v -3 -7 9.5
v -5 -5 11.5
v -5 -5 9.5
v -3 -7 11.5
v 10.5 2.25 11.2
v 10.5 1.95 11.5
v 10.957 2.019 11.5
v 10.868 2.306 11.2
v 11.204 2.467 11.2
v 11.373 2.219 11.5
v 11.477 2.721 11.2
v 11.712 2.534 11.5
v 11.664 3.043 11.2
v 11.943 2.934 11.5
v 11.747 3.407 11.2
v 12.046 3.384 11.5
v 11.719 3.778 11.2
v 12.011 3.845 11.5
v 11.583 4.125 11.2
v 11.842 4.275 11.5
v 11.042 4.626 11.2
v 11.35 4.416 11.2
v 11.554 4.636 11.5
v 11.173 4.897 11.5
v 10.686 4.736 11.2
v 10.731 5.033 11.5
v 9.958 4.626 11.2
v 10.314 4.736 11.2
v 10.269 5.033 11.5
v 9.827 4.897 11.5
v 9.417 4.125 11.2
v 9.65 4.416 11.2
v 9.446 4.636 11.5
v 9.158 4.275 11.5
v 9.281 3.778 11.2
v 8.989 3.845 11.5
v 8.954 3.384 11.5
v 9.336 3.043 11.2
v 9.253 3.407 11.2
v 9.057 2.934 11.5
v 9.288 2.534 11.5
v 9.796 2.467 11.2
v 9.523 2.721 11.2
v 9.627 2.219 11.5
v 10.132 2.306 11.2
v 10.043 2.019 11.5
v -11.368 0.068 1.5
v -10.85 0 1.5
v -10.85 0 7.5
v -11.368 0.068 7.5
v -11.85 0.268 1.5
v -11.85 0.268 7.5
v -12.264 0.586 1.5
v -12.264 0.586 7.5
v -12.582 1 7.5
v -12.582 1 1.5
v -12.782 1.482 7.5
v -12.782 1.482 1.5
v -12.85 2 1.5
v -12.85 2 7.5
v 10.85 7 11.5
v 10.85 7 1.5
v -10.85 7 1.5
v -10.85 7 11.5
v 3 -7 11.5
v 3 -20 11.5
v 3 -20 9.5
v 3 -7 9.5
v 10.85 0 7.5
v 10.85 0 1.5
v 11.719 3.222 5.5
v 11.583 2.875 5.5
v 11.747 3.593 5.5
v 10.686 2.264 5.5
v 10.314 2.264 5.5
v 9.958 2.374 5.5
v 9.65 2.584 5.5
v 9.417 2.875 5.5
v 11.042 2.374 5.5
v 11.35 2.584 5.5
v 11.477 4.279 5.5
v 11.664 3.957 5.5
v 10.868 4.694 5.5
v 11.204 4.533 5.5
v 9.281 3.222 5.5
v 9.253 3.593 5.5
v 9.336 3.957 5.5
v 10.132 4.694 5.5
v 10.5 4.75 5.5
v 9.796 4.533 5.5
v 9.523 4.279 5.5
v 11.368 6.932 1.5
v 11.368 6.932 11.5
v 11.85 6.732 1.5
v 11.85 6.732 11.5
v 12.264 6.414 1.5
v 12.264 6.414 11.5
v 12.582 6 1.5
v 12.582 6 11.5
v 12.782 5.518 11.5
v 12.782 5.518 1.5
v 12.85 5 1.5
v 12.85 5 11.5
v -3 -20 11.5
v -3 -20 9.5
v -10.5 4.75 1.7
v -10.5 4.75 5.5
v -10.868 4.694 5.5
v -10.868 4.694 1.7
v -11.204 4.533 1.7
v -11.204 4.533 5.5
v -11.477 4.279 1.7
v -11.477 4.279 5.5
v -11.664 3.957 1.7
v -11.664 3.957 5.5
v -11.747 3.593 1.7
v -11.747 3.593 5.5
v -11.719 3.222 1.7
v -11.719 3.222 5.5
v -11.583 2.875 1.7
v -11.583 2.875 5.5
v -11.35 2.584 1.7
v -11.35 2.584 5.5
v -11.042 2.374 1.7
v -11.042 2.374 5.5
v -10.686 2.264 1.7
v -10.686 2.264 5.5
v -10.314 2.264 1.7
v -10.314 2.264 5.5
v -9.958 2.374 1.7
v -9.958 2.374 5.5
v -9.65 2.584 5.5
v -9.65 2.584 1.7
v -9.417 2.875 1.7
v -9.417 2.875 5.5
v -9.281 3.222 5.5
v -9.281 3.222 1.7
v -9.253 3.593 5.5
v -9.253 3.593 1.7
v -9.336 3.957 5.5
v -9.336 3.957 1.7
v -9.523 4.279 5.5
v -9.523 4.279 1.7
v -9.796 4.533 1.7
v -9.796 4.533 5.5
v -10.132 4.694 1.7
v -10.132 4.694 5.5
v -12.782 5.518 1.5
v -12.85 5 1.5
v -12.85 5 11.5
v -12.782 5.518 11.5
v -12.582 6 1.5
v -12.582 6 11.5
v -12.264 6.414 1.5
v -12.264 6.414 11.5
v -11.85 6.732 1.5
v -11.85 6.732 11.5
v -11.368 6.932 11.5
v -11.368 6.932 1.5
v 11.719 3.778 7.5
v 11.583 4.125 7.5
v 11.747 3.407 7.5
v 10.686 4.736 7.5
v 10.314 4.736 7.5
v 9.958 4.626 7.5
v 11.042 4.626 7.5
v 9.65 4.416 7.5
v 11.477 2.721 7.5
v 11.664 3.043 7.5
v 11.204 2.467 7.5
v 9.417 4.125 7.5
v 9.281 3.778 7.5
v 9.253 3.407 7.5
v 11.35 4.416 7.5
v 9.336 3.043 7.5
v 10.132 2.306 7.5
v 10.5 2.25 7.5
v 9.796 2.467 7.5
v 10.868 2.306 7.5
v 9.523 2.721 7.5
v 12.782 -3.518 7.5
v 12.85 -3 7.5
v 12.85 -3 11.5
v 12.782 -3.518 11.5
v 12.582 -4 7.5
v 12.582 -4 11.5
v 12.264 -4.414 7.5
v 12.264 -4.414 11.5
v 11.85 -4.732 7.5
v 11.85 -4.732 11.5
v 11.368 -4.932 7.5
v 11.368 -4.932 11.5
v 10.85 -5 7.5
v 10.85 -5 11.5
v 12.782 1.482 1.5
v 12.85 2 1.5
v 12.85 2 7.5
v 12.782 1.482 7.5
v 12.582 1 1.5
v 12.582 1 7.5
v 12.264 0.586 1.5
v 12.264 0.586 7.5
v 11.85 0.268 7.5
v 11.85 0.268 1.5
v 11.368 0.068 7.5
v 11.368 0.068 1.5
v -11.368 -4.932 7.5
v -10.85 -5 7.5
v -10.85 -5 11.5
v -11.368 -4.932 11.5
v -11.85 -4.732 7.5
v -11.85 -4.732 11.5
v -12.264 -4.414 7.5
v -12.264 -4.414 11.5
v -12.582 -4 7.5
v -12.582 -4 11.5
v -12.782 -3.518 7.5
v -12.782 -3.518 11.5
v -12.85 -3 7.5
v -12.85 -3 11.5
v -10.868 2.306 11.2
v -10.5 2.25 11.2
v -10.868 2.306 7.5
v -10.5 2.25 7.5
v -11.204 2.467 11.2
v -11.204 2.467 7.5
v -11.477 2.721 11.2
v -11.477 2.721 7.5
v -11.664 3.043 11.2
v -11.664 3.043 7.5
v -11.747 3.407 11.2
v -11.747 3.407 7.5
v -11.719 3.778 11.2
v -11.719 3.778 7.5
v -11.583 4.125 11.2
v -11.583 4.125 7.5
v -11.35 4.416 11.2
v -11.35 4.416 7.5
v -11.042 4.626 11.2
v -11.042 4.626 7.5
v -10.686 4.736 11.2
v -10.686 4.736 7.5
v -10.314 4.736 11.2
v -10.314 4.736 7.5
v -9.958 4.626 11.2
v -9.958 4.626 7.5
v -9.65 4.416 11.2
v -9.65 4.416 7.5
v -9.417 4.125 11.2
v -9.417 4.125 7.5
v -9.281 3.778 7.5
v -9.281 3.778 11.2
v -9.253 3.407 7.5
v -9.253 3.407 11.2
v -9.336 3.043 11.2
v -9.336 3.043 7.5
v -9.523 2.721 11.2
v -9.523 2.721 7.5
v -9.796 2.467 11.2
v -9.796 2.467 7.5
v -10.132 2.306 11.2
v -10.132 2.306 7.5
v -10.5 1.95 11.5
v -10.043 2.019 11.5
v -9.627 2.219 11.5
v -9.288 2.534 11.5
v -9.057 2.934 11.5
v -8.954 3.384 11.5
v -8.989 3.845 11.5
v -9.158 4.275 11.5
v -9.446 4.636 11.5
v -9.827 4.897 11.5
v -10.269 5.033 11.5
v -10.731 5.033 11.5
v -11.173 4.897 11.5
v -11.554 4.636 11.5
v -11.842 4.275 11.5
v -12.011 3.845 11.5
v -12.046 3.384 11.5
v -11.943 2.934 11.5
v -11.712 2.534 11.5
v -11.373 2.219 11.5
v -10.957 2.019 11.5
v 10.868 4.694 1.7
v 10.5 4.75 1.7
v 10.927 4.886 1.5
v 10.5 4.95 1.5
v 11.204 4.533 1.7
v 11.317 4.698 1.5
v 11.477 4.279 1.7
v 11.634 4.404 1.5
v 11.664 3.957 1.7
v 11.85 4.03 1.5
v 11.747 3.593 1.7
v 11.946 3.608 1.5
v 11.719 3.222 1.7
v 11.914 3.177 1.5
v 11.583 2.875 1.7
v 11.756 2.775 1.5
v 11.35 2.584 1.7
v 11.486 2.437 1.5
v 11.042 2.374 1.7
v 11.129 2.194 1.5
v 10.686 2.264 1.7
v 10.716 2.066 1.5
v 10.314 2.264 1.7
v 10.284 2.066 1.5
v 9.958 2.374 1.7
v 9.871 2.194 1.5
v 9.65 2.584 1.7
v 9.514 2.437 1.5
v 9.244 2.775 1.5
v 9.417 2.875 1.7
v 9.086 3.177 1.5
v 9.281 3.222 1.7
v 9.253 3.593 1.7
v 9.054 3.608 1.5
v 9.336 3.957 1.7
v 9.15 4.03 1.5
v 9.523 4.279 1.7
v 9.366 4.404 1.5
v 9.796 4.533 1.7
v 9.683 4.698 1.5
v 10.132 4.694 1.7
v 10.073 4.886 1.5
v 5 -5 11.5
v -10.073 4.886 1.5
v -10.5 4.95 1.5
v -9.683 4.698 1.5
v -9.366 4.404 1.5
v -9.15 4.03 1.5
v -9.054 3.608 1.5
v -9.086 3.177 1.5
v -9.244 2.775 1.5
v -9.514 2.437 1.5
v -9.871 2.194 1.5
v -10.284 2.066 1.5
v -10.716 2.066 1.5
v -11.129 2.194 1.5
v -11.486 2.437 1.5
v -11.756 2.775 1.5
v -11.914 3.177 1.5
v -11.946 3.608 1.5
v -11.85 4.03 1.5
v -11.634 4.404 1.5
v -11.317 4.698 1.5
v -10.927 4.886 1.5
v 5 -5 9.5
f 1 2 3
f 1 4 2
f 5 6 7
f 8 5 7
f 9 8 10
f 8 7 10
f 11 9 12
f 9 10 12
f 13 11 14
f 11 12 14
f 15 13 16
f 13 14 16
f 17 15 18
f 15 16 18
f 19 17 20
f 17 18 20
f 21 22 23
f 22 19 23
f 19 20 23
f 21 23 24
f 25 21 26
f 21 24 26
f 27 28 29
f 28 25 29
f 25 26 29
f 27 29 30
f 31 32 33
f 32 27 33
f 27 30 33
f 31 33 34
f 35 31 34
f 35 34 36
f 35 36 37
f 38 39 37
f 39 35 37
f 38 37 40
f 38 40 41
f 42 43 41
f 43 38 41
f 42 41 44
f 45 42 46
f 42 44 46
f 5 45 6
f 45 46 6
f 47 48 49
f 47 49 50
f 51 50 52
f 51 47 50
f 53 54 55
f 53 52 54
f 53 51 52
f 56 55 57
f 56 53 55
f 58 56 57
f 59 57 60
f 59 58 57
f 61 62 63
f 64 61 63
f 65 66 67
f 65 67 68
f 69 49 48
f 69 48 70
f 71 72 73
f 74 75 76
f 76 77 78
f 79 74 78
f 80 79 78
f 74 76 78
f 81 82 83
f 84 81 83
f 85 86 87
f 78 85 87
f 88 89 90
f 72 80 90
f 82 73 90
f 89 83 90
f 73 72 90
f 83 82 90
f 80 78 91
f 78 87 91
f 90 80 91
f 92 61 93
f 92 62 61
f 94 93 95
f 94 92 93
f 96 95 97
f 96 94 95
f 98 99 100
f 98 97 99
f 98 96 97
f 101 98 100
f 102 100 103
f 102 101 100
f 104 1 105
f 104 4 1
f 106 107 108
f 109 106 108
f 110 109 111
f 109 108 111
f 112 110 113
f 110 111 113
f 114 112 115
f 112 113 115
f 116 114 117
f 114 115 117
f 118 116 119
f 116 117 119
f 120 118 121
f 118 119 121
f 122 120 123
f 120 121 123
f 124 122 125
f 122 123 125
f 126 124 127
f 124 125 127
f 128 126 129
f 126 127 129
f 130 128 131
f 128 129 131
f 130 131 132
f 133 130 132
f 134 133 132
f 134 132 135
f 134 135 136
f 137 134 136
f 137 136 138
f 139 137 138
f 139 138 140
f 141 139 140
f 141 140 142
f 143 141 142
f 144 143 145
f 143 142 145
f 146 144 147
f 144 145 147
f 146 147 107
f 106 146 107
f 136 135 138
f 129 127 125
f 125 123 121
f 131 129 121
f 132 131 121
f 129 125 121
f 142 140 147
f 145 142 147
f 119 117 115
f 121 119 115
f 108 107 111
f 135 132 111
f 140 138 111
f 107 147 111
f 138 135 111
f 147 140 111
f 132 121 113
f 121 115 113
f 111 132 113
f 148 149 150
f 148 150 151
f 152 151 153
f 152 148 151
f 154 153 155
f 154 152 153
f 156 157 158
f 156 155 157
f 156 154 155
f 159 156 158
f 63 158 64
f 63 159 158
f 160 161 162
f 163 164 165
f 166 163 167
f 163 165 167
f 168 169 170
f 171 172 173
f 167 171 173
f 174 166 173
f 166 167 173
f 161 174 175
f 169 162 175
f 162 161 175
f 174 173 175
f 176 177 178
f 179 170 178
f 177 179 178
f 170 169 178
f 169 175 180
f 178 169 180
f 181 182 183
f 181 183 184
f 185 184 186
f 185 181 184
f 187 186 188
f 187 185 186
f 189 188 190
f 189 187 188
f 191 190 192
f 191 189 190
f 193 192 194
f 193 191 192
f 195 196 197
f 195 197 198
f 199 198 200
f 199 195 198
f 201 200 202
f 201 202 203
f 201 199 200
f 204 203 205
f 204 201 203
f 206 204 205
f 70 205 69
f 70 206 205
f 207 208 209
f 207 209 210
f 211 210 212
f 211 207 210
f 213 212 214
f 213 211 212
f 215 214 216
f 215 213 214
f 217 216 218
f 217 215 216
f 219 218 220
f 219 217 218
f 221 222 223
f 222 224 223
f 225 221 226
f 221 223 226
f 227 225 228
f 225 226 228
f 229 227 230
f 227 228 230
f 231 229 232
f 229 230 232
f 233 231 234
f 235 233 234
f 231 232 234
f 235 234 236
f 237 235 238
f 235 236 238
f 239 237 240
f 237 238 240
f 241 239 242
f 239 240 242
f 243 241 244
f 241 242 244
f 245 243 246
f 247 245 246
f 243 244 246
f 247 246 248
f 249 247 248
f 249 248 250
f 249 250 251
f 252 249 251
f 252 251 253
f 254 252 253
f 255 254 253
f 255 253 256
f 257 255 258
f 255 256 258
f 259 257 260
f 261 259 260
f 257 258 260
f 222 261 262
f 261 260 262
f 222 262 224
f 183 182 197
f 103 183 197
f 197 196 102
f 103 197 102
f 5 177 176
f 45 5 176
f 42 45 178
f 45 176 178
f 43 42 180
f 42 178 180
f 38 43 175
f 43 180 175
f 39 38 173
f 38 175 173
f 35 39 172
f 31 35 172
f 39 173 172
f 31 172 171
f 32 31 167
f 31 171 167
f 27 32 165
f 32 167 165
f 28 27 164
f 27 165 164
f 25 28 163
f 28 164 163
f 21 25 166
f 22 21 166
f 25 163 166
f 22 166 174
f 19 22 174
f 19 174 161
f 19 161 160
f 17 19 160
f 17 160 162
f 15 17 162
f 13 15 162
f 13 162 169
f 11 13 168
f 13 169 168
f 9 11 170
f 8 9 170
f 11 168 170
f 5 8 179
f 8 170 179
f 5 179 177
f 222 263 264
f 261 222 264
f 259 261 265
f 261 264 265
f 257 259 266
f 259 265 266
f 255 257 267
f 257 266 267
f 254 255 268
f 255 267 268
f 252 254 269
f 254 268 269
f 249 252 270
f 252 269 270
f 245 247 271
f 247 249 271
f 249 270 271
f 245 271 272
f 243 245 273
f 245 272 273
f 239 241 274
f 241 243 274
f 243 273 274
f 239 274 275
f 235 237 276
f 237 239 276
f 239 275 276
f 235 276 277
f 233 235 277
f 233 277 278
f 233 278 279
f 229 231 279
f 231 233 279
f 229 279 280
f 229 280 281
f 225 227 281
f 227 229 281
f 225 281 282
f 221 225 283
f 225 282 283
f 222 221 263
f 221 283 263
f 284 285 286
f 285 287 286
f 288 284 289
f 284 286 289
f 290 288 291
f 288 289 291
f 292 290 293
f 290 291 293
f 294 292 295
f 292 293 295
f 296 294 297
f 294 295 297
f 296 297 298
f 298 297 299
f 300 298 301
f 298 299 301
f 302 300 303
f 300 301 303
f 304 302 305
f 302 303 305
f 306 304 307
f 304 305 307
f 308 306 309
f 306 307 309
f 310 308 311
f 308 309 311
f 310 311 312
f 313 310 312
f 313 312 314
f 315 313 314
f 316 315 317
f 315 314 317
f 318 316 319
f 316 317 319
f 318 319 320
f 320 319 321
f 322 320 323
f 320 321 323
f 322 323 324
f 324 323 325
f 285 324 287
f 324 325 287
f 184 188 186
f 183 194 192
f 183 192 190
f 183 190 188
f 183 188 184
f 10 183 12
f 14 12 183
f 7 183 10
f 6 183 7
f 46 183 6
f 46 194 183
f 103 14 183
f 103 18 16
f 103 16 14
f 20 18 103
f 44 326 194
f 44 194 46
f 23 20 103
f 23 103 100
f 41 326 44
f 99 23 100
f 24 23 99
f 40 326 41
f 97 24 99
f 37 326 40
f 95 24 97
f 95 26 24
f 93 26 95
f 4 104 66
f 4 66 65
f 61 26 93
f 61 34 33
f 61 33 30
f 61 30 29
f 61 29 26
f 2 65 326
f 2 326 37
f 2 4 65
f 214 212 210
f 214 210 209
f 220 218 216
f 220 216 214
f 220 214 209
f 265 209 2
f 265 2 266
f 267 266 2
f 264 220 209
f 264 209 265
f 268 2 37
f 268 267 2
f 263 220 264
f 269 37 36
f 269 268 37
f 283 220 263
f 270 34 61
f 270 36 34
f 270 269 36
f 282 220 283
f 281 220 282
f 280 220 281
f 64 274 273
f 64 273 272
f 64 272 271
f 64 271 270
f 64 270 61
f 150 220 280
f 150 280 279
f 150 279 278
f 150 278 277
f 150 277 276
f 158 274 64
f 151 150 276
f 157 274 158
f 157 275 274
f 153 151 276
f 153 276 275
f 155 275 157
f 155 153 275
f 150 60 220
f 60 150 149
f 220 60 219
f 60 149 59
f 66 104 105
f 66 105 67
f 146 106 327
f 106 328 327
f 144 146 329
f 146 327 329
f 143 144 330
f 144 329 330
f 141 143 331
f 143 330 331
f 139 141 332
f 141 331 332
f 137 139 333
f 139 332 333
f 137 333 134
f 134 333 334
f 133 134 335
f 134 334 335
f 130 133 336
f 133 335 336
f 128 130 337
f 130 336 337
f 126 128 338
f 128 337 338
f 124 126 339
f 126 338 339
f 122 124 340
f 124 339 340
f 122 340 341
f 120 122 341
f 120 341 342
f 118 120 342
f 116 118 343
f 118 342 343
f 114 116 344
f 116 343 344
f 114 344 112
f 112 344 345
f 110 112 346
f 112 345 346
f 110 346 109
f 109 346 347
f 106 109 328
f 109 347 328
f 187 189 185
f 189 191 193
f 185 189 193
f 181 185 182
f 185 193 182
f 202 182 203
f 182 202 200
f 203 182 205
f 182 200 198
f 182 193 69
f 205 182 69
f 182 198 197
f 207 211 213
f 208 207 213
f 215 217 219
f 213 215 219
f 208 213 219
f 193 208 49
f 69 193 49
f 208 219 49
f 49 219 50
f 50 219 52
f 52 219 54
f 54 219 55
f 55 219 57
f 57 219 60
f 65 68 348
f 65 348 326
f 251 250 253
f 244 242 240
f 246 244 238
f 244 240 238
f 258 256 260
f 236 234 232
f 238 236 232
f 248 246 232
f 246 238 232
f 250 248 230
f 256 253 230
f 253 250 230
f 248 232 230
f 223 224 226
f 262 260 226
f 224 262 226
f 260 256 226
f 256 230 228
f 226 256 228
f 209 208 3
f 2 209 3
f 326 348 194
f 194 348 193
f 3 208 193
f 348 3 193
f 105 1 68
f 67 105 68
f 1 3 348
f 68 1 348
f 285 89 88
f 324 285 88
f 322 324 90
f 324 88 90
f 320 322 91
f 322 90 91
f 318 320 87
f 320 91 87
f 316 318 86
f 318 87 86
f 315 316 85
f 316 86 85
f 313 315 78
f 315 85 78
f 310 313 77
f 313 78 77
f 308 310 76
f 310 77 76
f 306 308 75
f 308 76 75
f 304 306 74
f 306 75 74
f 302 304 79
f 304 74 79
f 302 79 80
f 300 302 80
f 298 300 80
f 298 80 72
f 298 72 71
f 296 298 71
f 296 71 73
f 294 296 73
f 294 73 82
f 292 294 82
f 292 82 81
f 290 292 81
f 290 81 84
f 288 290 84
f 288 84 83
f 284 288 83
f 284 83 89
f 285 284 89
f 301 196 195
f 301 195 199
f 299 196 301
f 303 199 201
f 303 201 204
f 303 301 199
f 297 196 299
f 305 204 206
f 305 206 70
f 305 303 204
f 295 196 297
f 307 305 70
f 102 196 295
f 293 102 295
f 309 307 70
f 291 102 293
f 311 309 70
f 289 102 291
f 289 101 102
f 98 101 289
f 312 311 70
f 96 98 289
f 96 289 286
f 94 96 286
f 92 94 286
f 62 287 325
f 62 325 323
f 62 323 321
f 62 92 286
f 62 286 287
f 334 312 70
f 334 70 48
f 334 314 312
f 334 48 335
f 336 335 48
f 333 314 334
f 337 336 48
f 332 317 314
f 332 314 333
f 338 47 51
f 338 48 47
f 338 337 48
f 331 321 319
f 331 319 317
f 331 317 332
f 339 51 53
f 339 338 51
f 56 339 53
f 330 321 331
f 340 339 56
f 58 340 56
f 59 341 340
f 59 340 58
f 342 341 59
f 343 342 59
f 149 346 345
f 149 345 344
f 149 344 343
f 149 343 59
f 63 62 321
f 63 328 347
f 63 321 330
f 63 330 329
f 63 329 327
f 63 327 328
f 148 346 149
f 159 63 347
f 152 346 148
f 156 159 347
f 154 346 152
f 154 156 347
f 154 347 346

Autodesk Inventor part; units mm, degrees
ref_plane "YZ Plane" through (0, 0, 0) normal (1, 0, 0) x (0, 1, 0)
ref_plane "XZ Plane" through (0, 0, 0) normal (0, 1, 0) x (-1, 0, 0)
ref_plane "РабПлоскость1" through (0, -17.25, 7.5) normal (0, 0, 1) x (0, 1, 0)
sketch "Эскиз1" plane through (0, -17.25, 7.5) normal (0, 0, 1) x (0, 1, 0)
  line L0 (17.25, 0) -> (-17.1875, 0) construction
  line L1 (17.25, 10.35) -> (17.25, -10.35) construction
  line L2 (22.25, 12.85) -> (14.25, 12.85)
  line L3 (12.25, 10.85) -> (12.25, -10.85)
  line L4 (14.25, -12.85) -> (22.25, -12.85)
  line L5 (24.25, -10.85) -> (24.25, 10.85)
  line L6 (14.75, -12.85) -> (-9.95, -12.85) construction
  arc A0 (24.25, 10.85) -> (22.25, 12.85) centre (22.25, 10.85) ccw
  arc A1 (22.25, -12.85) -> (24.25, -10.85) centre (22.25, -10.85) ccw
  arc A2 (12.25, -10.85) -> (14.25, -12.85) centre (14.25, -10.85) ccw
  arc A3 (14.25, 12.85) -> (12.25, 10.85) centre (14.25, 10.85) ccw
  point P0 (12.25, -12.85)
  point P1 (12.25, 12.85)
  point P2 (24.25, -12.85)
  dimension "d1" = 5
  dimension "d2" = 12
  dimension "d3" = 2
  dimension "d6" = 2
extrude "Выдавливание1" add sketch "Эскиз1" along normal blind 4
sketch "Эскиз2" plane through (0, -17.25, 7.5) normal (0, 0, -1) x (-1, 0, 0)
  line L0 (10.35, 17.25) -> (-10.35, 17.25) construction
  line L1 (-10.85, 24.25) -> (10.85, 24.25) construction
  line L2 (-12.85, 14.25) -> (-12.85, 22.25) projected
  arc A0 (-12.85, 14.25) -> (-10.85, 12.25) centre (-10.85, 14.25) ccw projected
  line L3 (10.85, 12.25) -> (-10.85, 12.25) construction
  arc A1 (10.85, 12.25) -> (12.85, 14.25) centre (10.85, 14.25) ccw projected
  line L4 (12.85, 22.25) -> (12.85, 14.25) projected
  arc A2 (12.85, 22.25) -> (10.85, 24.25) centre (10.85, 22.25) ccw projected
  line L5 (-10.85, 24.25) -> (10.85, 24.25) projected
  arc A3 (-10.85, 24.25) -> (-12.85, 22.25) centre (-10.85, 22.25) ccw projected
  line L6 (12.85, 17.25) -> (-12.85, 17.25)
  point P0 (0, 17.25)
  point P1 (0, 17.25)
extrude "Выдавливание2" add sketch "Эскиз2" along normal blind 6
fillet "Сопряжение1" radius 2 2 edges at (-12.85, 0, 4.5) (12.85, 0, 4.5)
sketch "Эскиз3" plane through (0, -17.25, 1.5) normal (0, 0, -1) x (-1, 0, 0)
  arc A0 (-12.85, 19.25) -> (-10.85, 17.25) centre (-10.85, 19.25) ccw construction
  line L0 (-10.85, 17.25) -> (10.85, 17.25) construction
  arc A1 (10.85, 17.25) -> (12.85, 19.25) centre (10.85, 19.25) ccw construction
  line L1 (12.85, 19.25) -> (12.85, 22.25) construction
  arc A2 (12.85, 22.25) -> (10.85, 24.25) centre (10.85, 22.25) ccw construction
  line L2 (10.85, 24.25) -> (-10.85, 24.25) construction
  arc A3 (-10.85, 24.25) -> (-12.85, 22.25) centre (-10.85, 22.25) ccw construction
  line L3 (-12.85, 22.25) -> (-12.85, 19.25) construction
  line L4 (12.85, 20.75) -> (-12.85, 20.75) construction
  line L5 (0, 17.25) -> (0, 28) construction
  point P0 (10.5, 20.75)
  point P1 (-10.5, 20.75)
  dimension "d10" = 21
hole "Отверстие1" at (-10.5, 3.5, 1.5) at (10.5, 3.5, 1.5) direction (0, 0, 1) diameter 2.5 depth 4
chamfer "Фаска1" distance 0.2 angle 45 2 edges at (10.5, 2.25, 1.5) (-10.5, 2.25, 1.5)
sketch "Эскиз4" plane through (0, -17.25, 11.5) normal (0, 0, 1) x (1, 0, 0)
  line L0 (0, 17.25) -> (0, -22) construction
  line L1 (-10.85, 12.25) -> (10.85, 12.25) construction
  line L2 (-10.85, 12.25) -> (10.85, 12.25) projected
  line L3 (3, 12.25) -> (-3, 12.25)
  line L4 (-3, 12.25) -> (-3, -2.75)
  line L5 (-3, -2.75) -> (3, -2.75)
  line L6 (3, -2.75) -> (3, 12.25)
  dimension "d21" = 15
  dimension "d22" = 6
extrude "Выдавливание3" add sketch "Эскиз4" against normal blind 2
chamfer "Фаска2" distance 2 angle 45 2 edges at (-3, -5, 10.5) (3, -5, 10.5)
sketch "Эскиз5" plane through (0, -17.25, 11.5) normal (0, 0, 1) x (1, 0, 0)
  circle A0 centre (-10.5, 20.75) radius 1.45 projected
  circle A1 centre (10.5, 20.75) radius 1.45 projected
  circle A2 centre (-10.5, 20.75) radius 1.25 projected
  point P0 (0, 17.25)
hole "Отверстие2" at (10.5, 3.5, 11.5) at (-10.5, 3.5, 11.5) direction (0, 0, -1) diameter 2.5 depth 4
chamfer "Фаска3" distance 0.3 angle 45 2 edges at (10.5, 4.75, 11.5) (-10.5, 4.75, 11.5)
properties part number "Кронштейн МК"
